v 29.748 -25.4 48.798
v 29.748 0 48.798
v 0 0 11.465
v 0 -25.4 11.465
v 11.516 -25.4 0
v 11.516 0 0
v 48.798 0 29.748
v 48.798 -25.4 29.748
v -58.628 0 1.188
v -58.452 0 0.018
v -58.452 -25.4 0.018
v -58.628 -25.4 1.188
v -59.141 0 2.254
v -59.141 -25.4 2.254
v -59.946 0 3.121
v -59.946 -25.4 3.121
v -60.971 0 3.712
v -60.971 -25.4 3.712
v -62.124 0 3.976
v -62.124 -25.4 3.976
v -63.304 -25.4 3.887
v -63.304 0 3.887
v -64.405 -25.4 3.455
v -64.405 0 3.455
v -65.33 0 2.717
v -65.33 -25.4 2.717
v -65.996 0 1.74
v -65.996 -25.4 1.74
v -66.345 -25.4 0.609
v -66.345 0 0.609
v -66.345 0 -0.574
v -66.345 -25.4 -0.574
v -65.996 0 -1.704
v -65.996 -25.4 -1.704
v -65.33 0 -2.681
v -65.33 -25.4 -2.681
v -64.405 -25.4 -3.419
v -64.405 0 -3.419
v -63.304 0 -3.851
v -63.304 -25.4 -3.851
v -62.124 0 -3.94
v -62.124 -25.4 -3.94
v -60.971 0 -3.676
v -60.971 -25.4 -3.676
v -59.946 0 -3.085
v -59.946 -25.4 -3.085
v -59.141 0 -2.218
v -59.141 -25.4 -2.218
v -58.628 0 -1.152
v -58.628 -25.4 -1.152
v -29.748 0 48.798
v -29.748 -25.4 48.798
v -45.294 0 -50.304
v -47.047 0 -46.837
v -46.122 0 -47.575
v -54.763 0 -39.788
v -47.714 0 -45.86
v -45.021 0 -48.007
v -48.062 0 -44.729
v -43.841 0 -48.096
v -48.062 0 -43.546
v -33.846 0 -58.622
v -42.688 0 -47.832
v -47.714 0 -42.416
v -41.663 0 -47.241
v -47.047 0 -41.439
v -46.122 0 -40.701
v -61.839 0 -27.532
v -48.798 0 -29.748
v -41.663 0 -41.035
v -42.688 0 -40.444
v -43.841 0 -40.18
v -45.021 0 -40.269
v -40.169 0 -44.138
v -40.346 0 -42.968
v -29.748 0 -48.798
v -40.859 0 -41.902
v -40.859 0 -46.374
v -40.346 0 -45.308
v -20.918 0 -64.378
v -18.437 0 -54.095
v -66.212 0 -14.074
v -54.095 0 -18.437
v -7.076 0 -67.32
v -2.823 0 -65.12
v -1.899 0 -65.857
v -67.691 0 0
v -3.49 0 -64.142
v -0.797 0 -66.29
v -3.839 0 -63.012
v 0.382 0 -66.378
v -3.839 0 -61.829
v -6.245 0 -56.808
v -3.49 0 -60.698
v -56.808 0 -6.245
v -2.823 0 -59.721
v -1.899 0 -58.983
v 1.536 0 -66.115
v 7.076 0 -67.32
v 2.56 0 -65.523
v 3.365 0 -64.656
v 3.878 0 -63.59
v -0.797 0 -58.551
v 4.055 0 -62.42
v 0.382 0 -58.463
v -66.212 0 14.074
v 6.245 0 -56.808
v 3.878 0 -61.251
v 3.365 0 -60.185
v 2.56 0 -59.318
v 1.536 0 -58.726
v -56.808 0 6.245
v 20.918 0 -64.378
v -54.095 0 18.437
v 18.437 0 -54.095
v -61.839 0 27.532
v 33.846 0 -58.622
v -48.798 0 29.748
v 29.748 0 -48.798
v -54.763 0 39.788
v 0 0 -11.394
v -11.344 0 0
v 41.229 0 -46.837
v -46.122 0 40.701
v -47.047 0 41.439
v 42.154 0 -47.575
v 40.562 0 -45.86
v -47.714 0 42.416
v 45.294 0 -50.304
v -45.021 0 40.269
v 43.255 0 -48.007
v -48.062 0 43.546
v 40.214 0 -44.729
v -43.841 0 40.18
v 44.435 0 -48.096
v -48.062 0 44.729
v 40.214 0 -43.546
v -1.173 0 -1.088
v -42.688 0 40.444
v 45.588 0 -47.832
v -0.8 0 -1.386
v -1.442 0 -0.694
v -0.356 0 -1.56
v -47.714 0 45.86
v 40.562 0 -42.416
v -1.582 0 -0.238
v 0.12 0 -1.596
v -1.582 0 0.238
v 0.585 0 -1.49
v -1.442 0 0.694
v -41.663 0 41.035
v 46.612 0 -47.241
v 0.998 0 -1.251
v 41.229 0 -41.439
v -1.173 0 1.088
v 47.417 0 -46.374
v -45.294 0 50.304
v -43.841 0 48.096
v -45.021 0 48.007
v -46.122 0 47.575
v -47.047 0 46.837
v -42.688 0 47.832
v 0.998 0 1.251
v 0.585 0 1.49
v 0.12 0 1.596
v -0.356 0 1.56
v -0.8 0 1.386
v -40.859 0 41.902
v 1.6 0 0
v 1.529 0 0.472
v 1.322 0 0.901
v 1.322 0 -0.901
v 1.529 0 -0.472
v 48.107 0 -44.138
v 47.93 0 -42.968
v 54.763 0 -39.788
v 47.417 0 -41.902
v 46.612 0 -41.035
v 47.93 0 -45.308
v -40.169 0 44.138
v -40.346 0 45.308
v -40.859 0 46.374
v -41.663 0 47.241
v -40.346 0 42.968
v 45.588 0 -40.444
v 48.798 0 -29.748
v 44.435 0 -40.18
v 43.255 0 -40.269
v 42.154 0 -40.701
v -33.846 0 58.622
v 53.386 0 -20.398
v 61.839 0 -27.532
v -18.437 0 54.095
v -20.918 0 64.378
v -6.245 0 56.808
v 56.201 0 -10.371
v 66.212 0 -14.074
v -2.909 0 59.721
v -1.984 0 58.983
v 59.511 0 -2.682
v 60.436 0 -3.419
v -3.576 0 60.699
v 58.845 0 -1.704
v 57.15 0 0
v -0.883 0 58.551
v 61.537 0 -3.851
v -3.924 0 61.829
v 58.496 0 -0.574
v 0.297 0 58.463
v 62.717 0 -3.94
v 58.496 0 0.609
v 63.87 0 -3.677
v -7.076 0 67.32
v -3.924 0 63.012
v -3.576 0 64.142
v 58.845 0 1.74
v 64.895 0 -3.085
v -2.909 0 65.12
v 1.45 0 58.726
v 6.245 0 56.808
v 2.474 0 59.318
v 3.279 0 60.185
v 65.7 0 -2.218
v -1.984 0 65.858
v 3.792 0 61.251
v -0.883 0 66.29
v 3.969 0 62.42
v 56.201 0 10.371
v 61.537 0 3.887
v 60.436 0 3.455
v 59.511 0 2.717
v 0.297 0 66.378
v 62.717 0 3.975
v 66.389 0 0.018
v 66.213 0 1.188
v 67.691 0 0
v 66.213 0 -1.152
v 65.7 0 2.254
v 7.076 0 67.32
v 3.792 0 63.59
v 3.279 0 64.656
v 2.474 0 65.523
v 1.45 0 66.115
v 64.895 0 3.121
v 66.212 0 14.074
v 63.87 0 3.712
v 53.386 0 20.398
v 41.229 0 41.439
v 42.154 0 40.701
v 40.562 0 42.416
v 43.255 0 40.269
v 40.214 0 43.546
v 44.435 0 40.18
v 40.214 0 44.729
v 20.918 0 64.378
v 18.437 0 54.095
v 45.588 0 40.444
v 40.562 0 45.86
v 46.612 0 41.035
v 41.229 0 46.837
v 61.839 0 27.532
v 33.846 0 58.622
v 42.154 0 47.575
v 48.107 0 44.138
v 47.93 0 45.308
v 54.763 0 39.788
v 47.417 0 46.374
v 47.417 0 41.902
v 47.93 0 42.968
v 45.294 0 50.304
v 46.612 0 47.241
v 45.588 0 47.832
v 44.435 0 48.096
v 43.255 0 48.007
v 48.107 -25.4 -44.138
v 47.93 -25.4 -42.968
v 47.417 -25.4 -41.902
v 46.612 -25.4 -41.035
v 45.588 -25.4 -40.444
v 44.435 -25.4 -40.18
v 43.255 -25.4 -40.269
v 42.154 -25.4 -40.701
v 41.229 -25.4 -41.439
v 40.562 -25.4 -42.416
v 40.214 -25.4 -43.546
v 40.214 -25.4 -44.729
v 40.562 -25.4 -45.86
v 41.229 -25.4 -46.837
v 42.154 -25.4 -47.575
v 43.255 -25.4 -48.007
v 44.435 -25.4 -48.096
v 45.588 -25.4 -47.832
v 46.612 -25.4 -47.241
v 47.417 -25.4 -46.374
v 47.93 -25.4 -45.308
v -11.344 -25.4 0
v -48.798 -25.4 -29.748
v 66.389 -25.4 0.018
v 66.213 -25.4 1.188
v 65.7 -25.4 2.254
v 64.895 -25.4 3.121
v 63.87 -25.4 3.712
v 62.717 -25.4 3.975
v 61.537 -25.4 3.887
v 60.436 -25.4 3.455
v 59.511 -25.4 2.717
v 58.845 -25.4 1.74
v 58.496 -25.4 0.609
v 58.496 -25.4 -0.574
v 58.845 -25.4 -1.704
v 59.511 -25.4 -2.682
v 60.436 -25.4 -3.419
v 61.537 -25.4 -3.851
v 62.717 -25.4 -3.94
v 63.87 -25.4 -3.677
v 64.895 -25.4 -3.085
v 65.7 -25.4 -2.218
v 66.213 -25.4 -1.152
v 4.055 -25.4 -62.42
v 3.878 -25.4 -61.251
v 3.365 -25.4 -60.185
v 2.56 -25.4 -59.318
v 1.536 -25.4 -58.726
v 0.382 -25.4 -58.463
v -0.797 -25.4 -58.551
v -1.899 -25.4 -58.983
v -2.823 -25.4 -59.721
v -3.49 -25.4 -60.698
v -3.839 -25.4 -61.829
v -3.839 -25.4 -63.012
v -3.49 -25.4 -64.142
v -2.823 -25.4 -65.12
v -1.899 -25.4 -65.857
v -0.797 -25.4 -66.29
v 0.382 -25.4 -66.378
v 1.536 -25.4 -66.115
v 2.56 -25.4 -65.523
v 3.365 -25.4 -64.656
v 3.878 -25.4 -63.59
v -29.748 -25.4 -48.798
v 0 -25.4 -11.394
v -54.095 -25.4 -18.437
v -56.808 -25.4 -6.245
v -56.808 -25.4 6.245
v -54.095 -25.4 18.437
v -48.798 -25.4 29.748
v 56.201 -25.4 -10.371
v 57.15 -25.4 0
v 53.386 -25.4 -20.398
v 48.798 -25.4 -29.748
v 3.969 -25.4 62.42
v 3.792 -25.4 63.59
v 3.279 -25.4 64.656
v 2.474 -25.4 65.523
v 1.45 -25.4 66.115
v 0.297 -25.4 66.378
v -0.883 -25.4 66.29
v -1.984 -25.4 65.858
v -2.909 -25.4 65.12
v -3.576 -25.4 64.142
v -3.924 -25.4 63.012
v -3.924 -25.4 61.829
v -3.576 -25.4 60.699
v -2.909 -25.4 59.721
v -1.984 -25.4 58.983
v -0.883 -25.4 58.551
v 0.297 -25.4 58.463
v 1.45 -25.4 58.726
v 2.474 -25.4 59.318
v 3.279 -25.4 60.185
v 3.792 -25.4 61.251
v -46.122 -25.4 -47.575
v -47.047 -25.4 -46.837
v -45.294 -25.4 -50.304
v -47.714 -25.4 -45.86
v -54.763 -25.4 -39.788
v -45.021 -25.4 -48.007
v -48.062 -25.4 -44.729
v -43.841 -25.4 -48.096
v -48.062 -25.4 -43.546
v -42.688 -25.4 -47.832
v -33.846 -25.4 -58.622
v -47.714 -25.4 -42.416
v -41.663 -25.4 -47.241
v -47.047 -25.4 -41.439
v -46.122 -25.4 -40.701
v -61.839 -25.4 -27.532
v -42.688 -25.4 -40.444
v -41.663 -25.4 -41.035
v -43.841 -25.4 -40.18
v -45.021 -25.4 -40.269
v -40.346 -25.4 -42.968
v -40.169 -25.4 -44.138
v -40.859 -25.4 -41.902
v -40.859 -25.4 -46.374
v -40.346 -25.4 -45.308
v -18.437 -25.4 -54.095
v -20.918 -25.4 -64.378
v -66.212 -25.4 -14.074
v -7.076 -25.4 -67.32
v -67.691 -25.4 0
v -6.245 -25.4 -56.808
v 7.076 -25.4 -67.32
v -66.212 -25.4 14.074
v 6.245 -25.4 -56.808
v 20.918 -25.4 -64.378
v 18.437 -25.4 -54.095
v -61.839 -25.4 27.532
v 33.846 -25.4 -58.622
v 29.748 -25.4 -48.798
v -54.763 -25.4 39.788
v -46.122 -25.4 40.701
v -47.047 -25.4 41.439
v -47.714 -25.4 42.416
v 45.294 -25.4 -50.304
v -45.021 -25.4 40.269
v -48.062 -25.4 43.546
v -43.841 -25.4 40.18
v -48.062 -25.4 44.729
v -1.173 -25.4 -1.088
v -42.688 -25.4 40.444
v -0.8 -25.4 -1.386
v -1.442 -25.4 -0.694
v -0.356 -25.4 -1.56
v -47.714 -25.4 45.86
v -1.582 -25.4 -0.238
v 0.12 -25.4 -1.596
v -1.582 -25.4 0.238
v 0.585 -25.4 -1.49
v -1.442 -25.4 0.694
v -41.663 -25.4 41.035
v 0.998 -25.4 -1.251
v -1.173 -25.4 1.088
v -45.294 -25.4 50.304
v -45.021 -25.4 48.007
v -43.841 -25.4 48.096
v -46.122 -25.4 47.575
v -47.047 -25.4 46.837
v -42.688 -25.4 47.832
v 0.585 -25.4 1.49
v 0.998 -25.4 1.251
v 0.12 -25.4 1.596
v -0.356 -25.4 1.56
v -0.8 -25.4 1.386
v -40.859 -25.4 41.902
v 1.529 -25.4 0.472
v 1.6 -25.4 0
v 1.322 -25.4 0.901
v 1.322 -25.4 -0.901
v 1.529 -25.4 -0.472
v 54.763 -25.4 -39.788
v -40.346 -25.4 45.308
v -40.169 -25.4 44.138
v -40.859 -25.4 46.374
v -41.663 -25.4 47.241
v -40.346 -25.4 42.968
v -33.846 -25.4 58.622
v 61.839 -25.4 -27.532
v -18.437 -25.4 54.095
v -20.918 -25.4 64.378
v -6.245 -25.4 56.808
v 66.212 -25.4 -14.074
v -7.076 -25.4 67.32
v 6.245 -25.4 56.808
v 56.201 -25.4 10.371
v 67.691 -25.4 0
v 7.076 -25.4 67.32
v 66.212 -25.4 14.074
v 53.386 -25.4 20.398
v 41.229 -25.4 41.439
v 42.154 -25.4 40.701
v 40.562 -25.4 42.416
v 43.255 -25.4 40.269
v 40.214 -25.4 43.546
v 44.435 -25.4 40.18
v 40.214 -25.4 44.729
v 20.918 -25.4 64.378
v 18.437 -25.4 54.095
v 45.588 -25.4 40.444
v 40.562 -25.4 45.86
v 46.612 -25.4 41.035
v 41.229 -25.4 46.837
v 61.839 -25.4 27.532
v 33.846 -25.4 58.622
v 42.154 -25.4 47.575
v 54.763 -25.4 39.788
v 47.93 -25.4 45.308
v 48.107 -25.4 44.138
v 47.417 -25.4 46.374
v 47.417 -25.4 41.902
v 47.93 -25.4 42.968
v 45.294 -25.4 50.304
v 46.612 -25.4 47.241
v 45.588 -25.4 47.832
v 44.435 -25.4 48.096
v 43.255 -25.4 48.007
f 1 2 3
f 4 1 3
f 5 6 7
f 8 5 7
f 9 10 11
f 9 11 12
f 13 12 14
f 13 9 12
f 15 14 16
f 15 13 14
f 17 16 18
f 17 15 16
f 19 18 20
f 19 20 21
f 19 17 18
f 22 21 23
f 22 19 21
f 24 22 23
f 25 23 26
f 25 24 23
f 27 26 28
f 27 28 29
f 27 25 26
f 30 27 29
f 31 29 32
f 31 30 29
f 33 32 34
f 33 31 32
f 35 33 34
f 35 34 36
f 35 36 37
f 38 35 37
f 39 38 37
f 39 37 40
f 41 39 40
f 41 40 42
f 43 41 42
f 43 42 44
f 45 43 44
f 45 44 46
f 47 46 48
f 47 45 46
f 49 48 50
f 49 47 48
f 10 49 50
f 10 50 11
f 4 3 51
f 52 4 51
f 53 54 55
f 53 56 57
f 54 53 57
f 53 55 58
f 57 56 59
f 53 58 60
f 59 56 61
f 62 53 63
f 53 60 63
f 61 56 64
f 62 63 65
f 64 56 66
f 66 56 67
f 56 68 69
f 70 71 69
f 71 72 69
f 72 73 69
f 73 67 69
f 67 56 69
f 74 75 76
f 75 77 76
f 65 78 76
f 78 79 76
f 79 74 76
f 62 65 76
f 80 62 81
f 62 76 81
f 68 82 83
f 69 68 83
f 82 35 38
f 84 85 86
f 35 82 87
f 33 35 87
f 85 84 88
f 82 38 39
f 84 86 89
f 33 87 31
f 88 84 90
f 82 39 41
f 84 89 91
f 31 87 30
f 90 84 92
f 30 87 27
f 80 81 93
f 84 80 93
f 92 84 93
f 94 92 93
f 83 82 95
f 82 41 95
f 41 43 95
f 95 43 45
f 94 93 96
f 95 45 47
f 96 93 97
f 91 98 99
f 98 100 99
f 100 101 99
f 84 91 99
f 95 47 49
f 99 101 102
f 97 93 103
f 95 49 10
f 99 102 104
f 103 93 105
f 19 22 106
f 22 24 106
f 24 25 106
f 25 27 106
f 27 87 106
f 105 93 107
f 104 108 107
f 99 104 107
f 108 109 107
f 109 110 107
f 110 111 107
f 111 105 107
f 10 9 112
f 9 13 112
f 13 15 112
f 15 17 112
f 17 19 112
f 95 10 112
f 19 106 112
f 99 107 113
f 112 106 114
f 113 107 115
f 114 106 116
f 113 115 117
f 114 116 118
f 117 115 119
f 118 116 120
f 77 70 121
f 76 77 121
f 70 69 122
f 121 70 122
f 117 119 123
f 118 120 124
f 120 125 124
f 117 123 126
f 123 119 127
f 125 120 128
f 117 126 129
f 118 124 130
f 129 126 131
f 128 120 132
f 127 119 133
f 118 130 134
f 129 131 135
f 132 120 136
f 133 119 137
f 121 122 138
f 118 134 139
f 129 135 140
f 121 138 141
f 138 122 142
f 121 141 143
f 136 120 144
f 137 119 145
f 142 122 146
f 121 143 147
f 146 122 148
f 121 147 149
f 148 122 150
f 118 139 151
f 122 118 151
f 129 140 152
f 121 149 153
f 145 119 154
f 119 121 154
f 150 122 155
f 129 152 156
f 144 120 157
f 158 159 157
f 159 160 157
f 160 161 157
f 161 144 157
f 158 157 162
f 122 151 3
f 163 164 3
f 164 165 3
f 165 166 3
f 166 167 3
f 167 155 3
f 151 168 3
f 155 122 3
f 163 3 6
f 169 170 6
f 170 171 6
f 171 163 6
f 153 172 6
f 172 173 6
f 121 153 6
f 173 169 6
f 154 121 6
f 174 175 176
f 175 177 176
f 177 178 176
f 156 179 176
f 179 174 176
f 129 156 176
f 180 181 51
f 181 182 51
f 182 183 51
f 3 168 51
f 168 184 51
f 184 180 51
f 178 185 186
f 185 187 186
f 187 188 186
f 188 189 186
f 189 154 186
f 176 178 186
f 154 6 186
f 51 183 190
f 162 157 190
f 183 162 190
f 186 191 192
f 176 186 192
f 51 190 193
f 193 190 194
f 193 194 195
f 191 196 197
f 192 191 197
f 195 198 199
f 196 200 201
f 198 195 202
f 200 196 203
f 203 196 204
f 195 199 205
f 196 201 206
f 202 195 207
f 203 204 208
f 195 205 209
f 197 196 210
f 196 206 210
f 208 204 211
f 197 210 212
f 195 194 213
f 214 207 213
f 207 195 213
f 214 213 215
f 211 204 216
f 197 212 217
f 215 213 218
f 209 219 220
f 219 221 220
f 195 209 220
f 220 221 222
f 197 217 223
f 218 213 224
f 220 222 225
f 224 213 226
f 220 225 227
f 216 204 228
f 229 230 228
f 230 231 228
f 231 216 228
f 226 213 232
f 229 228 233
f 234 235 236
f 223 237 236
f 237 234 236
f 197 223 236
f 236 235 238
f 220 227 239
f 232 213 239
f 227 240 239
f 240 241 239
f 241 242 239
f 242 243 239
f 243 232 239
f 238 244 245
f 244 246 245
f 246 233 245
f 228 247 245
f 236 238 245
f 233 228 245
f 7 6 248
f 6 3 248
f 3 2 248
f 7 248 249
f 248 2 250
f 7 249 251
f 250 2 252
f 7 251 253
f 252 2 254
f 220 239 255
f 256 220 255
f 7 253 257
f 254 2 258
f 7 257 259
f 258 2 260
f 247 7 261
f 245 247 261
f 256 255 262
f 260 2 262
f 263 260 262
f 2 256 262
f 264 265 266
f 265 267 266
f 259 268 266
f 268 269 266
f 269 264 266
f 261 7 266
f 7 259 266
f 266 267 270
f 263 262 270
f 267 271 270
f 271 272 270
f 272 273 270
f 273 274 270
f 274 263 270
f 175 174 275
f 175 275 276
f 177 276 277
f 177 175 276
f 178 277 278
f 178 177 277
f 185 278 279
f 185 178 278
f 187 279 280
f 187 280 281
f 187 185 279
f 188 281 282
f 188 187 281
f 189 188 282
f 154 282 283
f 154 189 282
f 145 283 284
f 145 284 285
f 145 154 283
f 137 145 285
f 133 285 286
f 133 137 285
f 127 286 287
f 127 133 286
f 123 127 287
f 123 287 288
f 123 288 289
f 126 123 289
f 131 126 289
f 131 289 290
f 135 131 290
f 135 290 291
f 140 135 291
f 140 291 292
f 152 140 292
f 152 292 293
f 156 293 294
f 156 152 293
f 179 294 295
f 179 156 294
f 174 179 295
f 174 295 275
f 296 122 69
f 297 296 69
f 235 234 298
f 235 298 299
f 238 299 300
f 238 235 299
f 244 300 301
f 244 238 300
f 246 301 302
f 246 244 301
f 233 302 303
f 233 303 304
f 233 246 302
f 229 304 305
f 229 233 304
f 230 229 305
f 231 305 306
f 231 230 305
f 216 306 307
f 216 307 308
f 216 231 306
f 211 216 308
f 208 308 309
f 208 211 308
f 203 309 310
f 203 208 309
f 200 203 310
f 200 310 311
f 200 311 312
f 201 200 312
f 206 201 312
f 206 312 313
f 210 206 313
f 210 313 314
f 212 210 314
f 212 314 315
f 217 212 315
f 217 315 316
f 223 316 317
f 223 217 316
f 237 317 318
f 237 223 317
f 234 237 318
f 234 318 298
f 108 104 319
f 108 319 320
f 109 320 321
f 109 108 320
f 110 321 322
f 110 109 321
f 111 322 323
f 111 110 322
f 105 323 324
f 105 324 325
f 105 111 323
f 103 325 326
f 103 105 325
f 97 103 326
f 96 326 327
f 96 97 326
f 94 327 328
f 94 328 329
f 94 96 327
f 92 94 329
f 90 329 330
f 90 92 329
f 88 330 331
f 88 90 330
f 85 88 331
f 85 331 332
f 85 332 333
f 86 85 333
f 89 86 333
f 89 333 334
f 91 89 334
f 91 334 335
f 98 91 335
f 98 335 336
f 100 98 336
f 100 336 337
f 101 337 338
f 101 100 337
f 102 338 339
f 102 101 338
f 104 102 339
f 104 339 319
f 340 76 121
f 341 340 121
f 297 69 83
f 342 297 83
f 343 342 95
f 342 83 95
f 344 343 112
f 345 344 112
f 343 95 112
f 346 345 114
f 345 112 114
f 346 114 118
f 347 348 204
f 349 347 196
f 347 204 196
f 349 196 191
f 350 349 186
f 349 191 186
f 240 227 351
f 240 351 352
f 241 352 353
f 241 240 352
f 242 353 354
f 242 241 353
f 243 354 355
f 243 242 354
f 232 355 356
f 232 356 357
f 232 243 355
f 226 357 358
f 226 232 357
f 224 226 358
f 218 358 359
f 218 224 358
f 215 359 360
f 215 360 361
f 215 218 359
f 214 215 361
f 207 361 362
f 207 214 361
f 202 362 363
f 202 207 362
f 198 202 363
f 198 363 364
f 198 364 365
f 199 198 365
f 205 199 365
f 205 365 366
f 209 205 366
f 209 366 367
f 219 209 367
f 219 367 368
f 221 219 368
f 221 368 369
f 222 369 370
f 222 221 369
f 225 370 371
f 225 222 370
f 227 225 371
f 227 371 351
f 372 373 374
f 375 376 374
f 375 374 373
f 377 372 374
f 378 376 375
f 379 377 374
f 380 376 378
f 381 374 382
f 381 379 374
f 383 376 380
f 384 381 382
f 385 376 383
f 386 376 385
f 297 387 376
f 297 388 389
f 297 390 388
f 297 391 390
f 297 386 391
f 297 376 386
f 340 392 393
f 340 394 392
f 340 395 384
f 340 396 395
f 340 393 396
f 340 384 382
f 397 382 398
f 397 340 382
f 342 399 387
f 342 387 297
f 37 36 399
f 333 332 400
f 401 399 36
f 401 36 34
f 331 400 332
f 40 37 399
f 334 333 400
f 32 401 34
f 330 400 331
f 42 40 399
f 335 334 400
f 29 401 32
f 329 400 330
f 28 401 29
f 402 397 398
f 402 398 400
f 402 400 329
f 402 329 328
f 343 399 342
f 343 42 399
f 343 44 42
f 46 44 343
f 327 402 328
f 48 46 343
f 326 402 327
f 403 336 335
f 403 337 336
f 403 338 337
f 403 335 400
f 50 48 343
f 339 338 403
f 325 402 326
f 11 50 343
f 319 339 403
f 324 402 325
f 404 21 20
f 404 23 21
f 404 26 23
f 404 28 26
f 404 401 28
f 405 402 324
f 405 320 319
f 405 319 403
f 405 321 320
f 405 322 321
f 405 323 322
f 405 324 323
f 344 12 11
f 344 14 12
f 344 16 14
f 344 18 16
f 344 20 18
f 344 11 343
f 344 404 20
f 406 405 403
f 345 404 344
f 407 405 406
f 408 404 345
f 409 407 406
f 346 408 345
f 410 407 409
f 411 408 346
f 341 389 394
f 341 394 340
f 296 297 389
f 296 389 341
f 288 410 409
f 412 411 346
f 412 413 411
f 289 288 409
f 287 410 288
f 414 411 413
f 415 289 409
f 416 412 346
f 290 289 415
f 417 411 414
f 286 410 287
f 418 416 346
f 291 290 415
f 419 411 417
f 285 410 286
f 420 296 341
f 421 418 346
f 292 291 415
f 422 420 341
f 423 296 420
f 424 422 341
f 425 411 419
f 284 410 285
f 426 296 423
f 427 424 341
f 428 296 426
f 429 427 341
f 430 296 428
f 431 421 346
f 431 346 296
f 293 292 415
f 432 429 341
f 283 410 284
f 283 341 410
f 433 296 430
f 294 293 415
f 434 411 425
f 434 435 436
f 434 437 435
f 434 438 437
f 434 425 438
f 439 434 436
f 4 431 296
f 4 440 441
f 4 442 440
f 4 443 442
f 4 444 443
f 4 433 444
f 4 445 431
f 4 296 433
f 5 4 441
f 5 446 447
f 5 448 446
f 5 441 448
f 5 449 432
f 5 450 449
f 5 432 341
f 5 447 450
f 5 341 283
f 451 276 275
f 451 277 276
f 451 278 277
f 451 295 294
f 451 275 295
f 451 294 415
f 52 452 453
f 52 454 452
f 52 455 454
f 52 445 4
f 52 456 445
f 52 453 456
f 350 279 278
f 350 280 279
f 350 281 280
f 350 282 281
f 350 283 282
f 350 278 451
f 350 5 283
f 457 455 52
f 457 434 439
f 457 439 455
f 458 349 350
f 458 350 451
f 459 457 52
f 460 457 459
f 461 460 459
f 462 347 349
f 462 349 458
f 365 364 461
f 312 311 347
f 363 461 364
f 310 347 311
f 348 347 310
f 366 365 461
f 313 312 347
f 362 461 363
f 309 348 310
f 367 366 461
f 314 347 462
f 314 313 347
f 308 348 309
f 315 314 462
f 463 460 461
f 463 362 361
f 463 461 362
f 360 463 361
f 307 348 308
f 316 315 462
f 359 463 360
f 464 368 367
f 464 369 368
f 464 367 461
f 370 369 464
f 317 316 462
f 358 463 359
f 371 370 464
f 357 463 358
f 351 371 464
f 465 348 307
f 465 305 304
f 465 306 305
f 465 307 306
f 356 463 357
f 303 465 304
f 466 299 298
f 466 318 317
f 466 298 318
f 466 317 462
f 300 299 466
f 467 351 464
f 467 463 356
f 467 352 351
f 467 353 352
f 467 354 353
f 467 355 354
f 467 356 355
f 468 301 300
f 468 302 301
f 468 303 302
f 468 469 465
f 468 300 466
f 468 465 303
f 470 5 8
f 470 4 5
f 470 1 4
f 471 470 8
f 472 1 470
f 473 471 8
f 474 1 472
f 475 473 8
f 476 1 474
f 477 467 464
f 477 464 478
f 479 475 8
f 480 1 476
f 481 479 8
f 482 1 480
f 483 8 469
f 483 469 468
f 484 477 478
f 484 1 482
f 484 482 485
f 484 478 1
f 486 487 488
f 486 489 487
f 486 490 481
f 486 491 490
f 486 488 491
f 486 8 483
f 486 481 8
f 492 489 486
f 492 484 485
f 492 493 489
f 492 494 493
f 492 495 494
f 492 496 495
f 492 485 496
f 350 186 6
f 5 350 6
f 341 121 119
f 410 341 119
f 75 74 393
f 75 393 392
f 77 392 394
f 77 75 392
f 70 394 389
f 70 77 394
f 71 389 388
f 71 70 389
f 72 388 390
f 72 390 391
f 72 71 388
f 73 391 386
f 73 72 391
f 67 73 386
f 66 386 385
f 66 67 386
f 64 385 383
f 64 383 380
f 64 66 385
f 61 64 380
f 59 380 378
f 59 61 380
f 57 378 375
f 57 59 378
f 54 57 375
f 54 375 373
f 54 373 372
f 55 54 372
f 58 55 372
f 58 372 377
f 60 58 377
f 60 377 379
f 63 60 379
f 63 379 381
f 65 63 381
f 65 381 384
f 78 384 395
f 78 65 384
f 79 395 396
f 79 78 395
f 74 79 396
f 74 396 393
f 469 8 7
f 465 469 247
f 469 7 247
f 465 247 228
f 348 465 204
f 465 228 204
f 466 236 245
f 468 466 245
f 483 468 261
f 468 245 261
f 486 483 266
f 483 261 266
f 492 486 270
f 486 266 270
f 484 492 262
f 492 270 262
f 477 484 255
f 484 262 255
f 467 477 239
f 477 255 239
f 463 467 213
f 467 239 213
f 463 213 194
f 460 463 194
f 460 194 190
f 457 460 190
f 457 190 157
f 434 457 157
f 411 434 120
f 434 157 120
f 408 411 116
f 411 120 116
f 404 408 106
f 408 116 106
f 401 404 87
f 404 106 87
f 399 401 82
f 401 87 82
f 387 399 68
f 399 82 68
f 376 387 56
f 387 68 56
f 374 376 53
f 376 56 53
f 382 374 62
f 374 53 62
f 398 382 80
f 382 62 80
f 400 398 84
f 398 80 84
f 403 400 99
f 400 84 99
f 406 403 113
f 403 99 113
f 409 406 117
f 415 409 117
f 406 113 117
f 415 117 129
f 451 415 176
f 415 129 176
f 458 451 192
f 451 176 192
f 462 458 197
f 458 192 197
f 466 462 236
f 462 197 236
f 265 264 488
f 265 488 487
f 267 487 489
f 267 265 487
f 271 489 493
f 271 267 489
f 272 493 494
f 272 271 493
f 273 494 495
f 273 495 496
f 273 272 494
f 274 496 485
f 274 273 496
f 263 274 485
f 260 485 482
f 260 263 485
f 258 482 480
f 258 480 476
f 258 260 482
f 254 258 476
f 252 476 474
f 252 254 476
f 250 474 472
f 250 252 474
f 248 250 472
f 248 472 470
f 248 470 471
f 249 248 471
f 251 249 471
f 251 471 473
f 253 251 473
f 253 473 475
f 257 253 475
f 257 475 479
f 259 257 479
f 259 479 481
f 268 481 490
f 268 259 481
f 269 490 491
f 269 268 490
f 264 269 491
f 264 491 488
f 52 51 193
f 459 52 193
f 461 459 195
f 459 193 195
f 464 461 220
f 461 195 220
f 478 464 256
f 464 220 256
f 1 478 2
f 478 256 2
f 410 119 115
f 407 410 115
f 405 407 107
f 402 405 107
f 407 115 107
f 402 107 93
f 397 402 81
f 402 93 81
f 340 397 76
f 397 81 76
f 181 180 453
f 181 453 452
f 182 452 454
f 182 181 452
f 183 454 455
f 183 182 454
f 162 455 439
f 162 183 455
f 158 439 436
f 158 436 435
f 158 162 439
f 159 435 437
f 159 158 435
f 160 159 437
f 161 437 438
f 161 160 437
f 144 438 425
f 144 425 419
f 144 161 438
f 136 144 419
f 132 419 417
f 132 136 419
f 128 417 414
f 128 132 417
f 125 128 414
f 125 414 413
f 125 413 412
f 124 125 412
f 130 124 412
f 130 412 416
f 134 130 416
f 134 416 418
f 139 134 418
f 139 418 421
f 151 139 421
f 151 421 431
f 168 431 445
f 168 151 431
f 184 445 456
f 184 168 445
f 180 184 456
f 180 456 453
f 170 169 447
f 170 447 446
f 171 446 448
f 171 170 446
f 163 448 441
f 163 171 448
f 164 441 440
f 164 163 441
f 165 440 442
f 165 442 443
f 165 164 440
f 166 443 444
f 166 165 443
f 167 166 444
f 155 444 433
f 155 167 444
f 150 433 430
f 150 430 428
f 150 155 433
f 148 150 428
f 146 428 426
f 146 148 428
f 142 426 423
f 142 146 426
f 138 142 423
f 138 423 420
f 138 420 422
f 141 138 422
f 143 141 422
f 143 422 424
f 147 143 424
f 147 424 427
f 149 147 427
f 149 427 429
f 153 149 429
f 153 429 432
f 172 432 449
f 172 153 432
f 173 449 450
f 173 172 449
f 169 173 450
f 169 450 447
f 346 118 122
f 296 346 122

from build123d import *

# Parameters (mm, degrees)
F0_R     = 67.691
F0_R_2   = 3.96875
F0_R_3   = 1.6002
F1_DEPTH = 25.4


with BuildPart() as f1:
    # F0 (on Front) → F1 (new body)
    with BuildSketch(Plane.XZ):
        Circle(F0_R)
        with Locations((-44.1379588351, -44.1379588351)):
            Circle(F0_R_2, mode=Mode.SUBTRACT)
        with Locations((0.085850288, -62.4204405388)):
            Circle(F0_R_2, mode=Mode.SUBTRACT)
        with Locations((44.1379588351, -44.1379588351)):
            Circle(F0_R_2, mode=Mode.SUBTRACT)
        with BuildLine():
            ThreePointArc((-48.797581084, -29.747581084), (-57.15, 0), (-48.797581084, 29.747581084))
            ThreePointArc((-48.797581084, 29.747581084), (-40.4111525448, 40.4111525448), (-29.747581084, 48.797581084))
            ThreePointArc((-29.747581084, 48.797581084), (0, 57.15), (29.747581084, 48.797581084))
            ThreePointArc((29.747581084, 48.797581084), (40.4111525448, 40.4111525448), (48.797581084, 29.747581084))
            ThreePointArc((48.797581084, 29.747581084), (55.0222875704, 15.4489601762), (57.15, 0))
            ThreePointArc((57.15, 0), (55.0222875704, -15.4489601762), (48.797581084, -29.747581084))
            ThreePointArc((48.797581084, -29.747581084), (40.4111525448, -40.4111525448), (29.747581084, -48.797581084))
            ThreePointArc((29.747581084, -48.797581084), (0, -57.15), (-29.747581084, -48.797581084))
            ThreePointArc((-29.747581084, -48.797581084), (-40.4111525448, -40.4111525448), (-48.797581084, -29.747581084))
        make_face(mode=Mode.SUBTRACT)
        with Locations((-62.4204890377, 0.0179510779)):
            Circle(F0_R_2, mode=Mode.SUBTRACT)
        with Locations((-44.1379588351, 44.1379588351)):
            Circle(F0_R_2, mode=Mode.SUBTRACT)
        with Locations((62.420497432, 0.0178410081)):
            Circle(F0_R_2, mode=Mode.SUBTRACT)
        with Locations((0, 62.4205)):
            Circle(F0_R_2, mode=Mode.SUBTRACT)
        with Locations((44.1379588351, 44.1379588351)):
            Circle(F0_R_2, mode=Mode.SUBTRACT)
        with BuildLine():
            ThreePointArc((-29.747581084, 48.797581084), (-40.4111525448, 40.4111525448), (-48.797581084, 29.747581084))
            Line((-48.797581084, 29.747581084), (-11.3440947012, 0.0002201395))
            Line((-11.3440947012, 0.0002201395), (-48.797581084, -29.747581084))
            ThreePointArc((-48.797581084, -29.747581084), (-40.4111525448, -40.4111525448), (-29.747581084, -48.797581084))
            Line((-29.747581084, -48.797581084), (0, -11.3939955701))
            Line((0, -11.3939955701), (29.747581084, -48.797581084))
            ThreePointArc((29.747581084, -48.797581084), (40.4111525448, -40.4111525448), (48.797581084, -29.747581084))
            Line((48.797581084, -29.747581084), (11.515794592, 0))
            Line((11.515794592, 0), (48.797581084, 29.747581084))
            ThreePointArc((48.797581084, 29.747581084), (40.4111525448, 40.4111525448), (29.747581084, 48.797581084))
            Line((29.747581084, 48.797581084), (0, 11.4653596026))
            Line((0, 11.4653596026), (-29.747581084, 48.797581084))
        make_face()
        Circle(F0_R_3, mode=Mode.SUBTRACT)
    extrude(amount=F1_DEPTH)


solid = f1.part
